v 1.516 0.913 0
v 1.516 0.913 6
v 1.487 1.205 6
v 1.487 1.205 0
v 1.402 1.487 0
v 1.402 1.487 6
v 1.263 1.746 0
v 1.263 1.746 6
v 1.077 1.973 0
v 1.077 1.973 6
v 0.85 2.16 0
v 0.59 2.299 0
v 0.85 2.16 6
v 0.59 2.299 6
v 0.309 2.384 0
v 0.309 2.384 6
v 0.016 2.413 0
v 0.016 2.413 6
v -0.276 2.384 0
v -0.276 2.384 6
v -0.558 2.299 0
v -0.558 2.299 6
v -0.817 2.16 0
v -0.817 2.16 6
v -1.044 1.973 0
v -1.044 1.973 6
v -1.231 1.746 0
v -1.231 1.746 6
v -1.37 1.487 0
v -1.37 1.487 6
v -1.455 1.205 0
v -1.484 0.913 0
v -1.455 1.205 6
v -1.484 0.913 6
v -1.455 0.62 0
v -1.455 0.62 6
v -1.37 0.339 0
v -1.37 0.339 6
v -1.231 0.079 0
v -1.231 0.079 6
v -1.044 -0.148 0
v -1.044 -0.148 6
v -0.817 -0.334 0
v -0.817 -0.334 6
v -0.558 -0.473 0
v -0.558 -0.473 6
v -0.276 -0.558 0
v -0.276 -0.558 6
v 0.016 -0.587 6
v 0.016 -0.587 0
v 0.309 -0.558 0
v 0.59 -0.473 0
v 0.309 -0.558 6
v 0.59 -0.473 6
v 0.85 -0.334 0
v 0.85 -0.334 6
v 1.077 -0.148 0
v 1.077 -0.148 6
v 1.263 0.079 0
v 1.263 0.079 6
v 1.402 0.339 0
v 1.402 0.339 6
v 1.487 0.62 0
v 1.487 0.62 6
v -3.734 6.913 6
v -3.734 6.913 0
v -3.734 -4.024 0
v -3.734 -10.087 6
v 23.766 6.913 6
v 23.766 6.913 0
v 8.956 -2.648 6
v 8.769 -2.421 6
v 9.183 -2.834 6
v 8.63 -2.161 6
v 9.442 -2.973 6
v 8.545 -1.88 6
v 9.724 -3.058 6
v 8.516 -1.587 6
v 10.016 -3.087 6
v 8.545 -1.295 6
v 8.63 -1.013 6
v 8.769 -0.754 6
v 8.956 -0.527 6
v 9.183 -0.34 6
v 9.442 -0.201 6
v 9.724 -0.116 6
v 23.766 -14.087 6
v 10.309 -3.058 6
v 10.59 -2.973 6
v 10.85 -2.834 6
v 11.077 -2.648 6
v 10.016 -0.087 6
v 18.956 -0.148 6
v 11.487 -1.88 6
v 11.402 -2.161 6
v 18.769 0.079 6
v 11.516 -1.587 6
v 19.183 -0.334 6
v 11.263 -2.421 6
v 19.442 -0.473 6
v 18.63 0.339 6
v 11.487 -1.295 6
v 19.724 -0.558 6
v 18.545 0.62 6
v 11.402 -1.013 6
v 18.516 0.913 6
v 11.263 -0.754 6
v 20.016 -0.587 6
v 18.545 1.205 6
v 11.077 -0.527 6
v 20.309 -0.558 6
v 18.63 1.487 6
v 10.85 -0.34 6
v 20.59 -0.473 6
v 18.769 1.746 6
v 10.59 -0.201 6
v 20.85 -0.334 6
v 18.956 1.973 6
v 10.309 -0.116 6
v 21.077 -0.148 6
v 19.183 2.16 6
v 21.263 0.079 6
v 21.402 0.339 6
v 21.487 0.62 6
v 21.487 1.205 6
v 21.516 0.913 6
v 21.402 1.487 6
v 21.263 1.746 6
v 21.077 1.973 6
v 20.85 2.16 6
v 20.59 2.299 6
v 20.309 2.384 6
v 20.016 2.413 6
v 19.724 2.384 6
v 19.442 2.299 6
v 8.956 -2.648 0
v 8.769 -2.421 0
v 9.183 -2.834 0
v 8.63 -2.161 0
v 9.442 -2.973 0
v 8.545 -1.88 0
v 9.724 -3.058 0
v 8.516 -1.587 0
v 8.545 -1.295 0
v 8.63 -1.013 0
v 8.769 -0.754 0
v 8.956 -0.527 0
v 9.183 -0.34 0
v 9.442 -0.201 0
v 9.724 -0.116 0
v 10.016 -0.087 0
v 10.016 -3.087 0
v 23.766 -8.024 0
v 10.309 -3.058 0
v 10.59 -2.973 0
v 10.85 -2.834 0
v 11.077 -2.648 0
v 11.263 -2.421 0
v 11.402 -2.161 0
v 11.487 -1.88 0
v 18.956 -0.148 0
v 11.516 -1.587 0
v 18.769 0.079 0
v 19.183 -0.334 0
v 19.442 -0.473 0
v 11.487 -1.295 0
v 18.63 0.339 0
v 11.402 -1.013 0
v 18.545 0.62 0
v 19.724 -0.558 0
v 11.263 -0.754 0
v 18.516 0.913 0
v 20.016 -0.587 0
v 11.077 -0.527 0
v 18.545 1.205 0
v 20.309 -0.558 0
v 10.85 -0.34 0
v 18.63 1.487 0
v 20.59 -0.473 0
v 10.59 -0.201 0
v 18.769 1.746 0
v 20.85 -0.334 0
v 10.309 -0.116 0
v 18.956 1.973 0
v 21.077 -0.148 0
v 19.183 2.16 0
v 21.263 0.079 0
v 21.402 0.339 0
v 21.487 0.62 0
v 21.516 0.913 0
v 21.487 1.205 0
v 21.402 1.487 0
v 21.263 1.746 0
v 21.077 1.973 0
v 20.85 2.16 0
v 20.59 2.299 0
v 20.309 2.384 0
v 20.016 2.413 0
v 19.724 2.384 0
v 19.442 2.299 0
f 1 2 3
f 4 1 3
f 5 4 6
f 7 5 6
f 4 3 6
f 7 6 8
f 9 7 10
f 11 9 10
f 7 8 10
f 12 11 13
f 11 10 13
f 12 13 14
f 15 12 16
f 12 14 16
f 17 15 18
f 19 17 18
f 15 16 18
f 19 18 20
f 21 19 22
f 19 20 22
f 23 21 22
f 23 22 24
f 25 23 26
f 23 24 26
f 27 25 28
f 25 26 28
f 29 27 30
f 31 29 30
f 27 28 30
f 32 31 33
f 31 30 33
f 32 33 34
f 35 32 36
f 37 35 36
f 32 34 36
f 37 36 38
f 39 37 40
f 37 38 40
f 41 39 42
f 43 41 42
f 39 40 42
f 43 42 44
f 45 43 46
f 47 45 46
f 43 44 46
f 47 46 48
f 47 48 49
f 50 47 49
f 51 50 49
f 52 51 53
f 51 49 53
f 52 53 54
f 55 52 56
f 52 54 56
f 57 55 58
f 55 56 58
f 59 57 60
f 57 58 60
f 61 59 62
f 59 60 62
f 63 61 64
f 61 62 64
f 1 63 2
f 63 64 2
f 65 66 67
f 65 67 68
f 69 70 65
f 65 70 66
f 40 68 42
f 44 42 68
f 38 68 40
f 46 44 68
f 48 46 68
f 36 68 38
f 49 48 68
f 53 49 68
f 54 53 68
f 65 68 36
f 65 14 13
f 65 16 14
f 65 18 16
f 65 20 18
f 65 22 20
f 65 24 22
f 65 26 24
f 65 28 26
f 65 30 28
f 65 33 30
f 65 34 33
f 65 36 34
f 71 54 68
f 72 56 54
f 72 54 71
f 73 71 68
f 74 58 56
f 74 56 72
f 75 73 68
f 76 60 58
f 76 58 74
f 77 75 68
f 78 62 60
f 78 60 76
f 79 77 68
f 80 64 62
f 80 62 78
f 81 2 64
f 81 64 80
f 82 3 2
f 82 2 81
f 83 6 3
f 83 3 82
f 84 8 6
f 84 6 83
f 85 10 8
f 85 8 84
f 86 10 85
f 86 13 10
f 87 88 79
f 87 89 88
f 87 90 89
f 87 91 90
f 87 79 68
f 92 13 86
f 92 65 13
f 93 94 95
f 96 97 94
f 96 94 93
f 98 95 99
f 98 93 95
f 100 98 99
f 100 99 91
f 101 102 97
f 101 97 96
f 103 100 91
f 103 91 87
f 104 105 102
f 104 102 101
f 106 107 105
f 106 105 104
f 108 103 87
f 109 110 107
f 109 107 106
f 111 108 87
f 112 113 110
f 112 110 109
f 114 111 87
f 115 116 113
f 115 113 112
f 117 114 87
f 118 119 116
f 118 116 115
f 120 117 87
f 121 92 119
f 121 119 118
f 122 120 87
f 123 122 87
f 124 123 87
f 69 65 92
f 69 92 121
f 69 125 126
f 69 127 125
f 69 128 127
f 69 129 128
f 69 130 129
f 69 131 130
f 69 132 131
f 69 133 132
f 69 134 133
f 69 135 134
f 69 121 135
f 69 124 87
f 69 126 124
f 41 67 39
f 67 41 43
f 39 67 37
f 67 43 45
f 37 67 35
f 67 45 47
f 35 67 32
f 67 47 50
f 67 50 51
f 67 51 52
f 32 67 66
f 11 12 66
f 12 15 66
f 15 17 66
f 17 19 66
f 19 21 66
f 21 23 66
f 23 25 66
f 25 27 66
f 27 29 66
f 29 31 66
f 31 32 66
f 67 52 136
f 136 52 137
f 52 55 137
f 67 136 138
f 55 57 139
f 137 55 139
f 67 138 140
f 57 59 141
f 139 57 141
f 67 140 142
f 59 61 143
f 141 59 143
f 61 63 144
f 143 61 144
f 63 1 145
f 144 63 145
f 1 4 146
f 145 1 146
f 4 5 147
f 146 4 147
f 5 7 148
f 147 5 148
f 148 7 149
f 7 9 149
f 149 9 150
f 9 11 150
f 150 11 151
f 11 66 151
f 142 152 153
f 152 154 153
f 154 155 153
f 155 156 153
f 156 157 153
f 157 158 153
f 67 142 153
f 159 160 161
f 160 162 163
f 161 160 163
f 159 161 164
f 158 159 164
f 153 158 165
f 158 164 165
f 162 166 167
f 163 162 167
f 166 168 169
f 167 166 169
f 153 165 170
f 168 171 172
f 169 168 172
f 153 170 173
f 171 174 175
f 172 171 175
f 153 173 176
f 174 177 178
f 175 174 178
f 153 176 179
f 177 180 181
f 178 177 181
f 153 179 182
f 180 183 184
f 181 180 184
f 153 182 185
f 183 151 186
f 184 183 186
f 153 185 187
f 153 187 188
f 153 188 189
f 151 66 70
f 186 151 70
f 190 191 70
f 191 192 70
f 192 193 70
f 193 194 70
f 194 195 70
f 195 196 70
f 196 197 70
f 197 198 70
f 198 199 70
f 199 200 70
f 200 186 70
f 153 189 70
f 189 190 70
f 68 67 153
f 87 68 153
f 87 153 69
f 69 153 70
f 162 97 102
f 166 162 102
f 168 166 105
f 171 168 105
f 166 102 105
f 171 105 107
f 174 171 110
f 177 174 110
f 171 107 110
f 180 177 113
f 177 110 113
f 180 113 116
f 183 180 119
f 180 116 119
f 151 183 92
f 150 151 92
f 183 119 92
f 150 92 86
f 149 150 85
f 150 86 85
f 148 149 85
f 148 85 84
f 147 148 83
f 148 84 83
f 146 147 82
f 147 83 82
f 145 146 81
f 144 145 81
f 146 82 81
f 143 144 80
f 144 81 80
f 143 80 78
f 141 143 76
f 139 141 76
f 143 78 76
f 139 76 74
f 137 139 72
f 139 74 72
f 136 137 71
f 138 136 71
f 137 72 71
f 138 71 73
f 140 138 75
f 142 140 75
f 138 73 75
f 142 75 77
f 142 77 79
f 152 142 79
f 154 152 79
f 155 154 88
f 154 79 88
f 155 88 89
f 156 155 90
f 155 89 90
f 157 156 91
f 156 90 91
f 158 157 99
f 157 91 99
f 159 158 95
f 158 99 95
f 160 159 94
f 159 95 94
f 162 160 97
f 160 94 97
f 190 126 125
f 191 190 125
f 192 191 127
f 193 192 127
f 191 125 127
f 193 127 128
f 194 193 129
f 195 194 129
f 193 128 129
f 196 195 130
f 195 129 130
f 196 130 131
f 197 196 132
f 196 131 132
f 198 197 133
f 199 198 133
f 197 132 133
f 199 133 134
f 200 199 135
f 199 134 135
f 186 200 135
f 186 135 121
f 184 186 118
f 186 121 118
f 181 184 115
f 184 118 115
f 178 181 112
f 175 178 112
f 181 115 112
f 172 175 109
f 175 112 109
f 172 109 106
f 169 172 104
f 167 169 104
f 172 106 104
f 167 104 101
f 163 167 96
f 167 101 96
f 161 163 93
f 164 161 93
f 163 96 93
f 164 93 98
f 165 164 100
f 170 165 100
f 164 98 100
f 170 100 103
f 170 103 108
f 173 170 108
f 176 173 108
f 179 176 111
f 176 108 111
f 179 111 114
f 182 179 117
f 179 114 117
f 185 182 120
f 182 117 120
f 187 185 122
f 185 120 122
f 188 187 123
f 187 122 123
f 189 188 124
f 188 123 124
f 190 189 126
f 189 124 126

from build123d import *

# Parameters (mm, degrees)
F1_DEPTH = 6
F2_SIZE  = 5.99999
F3_R     = 1.5
F4_DEPTH = 6


# Not quite as in the source:
# - a fillet or chamfer is up to 0.001 mm smaller than in the source, because OpenCascade refuses the exact size


with BuildPart() as f1:
    # F0 (on Top) → F1 (new body)
    with BuildSketch(Plane.XY):
        Polygon((23.7662842423, 6.9127185345), (-3.7337157577, 6.9127185345), (-3.7337157577, -10.0872814655), (23.7662842423, -14.0872814655), align=None)
    extrude(amount=F1_DEPTH)

    # F2 (size 6 in the source; OpenCascade refuses exactly that, so slightly less here)
    f2_edges = [f1.edges().sort_by_distance(p)[0] for p in [
        (10.016284, -12.087281, 0),
    ]]
    chamfer(f2_edges, length=F2_SIZE)

    # F3 (on face) → F4 (cut, through all)
    with BuildSketch(Plane.XY.offset(6)):
        with Locations((0.0162842423, 0.9127185345)):
            Circle(F3_R)
        with Locations((10.0162842423, -1.5872814655)):
            Circle(F3_R)
        with Locations((20.0162842423, 0.9127185345)):
            Circle(F3_R)
    extrude(amount=-F4_DEPTH, mode=Mode.SUBTRACT)


solid = f1.part
